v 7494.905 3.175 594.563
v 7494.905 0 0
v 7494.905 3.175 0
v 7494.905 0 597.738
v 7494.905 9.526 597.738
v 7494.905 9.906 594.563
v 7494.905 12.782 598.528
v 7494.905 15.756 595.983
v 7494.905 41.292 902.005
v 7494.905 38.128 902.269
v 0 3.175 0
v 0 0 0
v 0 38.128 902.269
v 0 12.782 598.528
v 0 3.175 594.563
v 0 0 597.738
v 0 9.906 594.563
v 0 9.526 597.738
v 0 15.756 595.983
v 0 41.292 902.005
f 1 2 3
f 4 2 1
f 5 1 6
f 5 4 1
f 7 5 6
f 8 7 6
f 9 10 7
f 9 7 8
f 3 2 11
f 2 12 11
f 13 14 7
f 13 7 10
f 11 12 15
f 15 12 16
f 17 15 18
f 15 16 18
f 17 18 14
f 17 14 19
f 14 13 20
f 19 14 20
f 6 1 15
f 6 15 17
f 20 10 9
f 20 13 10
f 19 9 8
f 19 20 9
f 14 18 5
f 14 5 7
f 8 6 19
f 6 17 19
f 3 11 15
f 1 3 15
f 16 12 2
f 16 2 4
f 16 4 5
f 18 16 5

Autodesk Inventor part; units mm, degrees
ref_plane "YZ Plane" through (0, 0, 0) normal (1, 0, 0) x (0, 1, 0)
ref_plane "XZ Plane" through (0, 0, 0) normal (0, 1, 0) x (-1, 0, 0)
ref_plane "XY Plane" through (0, 0, 0) normal (0, 0, 1) x (1, 0, 0)
sketch "Sketch1" plane through (0, 0, 0) normal (1, 0, 0) x (0, 1, 0)
  line L0 (0, 0) -> (0, 597.7382)
  line L1 (0, 0) -> (3.175, 0)
  line L2 (3.175, 0) -> (3.175, 594.5632)
  line L3 (3.175, 594.5632) -> (9.906, 594.5632)
  line L4 (9.906, 594.5632) -> (15.756, 595.9828)
  line L5 (0, 597.7382) -> (9.5263, 597.7382)
  line L6 (9.5263, 597.7382) -> (12.7824, 598.5283)
  line L7 (41.2921, 902.0052) -> (15.756, 595.9828)
  line L8 (12.7824, 598.5283) -> (38.1281, 902.2692)
  line L9 (38.1281, 902.2692) -> (41.2921, 902.0052)
  dimension "d0" = 594.5632
  dimension "d1" = 3.175
  dimension "d2" = 6.731
  dimension "d7" = 3.175
  dimension "d8" = 6.0198
  dimension "d9" = 166.36
  dimension "d10" = 3.175
  dimension "d11" = 108.41
  dimension "d12" = 3.175
  dimension "d13" = 307.086
extrude "Extrusion1" add sketch "Sketch1" along normal blind 7494.905
properties part number "Underlayment_Over_Intake_Vent"
